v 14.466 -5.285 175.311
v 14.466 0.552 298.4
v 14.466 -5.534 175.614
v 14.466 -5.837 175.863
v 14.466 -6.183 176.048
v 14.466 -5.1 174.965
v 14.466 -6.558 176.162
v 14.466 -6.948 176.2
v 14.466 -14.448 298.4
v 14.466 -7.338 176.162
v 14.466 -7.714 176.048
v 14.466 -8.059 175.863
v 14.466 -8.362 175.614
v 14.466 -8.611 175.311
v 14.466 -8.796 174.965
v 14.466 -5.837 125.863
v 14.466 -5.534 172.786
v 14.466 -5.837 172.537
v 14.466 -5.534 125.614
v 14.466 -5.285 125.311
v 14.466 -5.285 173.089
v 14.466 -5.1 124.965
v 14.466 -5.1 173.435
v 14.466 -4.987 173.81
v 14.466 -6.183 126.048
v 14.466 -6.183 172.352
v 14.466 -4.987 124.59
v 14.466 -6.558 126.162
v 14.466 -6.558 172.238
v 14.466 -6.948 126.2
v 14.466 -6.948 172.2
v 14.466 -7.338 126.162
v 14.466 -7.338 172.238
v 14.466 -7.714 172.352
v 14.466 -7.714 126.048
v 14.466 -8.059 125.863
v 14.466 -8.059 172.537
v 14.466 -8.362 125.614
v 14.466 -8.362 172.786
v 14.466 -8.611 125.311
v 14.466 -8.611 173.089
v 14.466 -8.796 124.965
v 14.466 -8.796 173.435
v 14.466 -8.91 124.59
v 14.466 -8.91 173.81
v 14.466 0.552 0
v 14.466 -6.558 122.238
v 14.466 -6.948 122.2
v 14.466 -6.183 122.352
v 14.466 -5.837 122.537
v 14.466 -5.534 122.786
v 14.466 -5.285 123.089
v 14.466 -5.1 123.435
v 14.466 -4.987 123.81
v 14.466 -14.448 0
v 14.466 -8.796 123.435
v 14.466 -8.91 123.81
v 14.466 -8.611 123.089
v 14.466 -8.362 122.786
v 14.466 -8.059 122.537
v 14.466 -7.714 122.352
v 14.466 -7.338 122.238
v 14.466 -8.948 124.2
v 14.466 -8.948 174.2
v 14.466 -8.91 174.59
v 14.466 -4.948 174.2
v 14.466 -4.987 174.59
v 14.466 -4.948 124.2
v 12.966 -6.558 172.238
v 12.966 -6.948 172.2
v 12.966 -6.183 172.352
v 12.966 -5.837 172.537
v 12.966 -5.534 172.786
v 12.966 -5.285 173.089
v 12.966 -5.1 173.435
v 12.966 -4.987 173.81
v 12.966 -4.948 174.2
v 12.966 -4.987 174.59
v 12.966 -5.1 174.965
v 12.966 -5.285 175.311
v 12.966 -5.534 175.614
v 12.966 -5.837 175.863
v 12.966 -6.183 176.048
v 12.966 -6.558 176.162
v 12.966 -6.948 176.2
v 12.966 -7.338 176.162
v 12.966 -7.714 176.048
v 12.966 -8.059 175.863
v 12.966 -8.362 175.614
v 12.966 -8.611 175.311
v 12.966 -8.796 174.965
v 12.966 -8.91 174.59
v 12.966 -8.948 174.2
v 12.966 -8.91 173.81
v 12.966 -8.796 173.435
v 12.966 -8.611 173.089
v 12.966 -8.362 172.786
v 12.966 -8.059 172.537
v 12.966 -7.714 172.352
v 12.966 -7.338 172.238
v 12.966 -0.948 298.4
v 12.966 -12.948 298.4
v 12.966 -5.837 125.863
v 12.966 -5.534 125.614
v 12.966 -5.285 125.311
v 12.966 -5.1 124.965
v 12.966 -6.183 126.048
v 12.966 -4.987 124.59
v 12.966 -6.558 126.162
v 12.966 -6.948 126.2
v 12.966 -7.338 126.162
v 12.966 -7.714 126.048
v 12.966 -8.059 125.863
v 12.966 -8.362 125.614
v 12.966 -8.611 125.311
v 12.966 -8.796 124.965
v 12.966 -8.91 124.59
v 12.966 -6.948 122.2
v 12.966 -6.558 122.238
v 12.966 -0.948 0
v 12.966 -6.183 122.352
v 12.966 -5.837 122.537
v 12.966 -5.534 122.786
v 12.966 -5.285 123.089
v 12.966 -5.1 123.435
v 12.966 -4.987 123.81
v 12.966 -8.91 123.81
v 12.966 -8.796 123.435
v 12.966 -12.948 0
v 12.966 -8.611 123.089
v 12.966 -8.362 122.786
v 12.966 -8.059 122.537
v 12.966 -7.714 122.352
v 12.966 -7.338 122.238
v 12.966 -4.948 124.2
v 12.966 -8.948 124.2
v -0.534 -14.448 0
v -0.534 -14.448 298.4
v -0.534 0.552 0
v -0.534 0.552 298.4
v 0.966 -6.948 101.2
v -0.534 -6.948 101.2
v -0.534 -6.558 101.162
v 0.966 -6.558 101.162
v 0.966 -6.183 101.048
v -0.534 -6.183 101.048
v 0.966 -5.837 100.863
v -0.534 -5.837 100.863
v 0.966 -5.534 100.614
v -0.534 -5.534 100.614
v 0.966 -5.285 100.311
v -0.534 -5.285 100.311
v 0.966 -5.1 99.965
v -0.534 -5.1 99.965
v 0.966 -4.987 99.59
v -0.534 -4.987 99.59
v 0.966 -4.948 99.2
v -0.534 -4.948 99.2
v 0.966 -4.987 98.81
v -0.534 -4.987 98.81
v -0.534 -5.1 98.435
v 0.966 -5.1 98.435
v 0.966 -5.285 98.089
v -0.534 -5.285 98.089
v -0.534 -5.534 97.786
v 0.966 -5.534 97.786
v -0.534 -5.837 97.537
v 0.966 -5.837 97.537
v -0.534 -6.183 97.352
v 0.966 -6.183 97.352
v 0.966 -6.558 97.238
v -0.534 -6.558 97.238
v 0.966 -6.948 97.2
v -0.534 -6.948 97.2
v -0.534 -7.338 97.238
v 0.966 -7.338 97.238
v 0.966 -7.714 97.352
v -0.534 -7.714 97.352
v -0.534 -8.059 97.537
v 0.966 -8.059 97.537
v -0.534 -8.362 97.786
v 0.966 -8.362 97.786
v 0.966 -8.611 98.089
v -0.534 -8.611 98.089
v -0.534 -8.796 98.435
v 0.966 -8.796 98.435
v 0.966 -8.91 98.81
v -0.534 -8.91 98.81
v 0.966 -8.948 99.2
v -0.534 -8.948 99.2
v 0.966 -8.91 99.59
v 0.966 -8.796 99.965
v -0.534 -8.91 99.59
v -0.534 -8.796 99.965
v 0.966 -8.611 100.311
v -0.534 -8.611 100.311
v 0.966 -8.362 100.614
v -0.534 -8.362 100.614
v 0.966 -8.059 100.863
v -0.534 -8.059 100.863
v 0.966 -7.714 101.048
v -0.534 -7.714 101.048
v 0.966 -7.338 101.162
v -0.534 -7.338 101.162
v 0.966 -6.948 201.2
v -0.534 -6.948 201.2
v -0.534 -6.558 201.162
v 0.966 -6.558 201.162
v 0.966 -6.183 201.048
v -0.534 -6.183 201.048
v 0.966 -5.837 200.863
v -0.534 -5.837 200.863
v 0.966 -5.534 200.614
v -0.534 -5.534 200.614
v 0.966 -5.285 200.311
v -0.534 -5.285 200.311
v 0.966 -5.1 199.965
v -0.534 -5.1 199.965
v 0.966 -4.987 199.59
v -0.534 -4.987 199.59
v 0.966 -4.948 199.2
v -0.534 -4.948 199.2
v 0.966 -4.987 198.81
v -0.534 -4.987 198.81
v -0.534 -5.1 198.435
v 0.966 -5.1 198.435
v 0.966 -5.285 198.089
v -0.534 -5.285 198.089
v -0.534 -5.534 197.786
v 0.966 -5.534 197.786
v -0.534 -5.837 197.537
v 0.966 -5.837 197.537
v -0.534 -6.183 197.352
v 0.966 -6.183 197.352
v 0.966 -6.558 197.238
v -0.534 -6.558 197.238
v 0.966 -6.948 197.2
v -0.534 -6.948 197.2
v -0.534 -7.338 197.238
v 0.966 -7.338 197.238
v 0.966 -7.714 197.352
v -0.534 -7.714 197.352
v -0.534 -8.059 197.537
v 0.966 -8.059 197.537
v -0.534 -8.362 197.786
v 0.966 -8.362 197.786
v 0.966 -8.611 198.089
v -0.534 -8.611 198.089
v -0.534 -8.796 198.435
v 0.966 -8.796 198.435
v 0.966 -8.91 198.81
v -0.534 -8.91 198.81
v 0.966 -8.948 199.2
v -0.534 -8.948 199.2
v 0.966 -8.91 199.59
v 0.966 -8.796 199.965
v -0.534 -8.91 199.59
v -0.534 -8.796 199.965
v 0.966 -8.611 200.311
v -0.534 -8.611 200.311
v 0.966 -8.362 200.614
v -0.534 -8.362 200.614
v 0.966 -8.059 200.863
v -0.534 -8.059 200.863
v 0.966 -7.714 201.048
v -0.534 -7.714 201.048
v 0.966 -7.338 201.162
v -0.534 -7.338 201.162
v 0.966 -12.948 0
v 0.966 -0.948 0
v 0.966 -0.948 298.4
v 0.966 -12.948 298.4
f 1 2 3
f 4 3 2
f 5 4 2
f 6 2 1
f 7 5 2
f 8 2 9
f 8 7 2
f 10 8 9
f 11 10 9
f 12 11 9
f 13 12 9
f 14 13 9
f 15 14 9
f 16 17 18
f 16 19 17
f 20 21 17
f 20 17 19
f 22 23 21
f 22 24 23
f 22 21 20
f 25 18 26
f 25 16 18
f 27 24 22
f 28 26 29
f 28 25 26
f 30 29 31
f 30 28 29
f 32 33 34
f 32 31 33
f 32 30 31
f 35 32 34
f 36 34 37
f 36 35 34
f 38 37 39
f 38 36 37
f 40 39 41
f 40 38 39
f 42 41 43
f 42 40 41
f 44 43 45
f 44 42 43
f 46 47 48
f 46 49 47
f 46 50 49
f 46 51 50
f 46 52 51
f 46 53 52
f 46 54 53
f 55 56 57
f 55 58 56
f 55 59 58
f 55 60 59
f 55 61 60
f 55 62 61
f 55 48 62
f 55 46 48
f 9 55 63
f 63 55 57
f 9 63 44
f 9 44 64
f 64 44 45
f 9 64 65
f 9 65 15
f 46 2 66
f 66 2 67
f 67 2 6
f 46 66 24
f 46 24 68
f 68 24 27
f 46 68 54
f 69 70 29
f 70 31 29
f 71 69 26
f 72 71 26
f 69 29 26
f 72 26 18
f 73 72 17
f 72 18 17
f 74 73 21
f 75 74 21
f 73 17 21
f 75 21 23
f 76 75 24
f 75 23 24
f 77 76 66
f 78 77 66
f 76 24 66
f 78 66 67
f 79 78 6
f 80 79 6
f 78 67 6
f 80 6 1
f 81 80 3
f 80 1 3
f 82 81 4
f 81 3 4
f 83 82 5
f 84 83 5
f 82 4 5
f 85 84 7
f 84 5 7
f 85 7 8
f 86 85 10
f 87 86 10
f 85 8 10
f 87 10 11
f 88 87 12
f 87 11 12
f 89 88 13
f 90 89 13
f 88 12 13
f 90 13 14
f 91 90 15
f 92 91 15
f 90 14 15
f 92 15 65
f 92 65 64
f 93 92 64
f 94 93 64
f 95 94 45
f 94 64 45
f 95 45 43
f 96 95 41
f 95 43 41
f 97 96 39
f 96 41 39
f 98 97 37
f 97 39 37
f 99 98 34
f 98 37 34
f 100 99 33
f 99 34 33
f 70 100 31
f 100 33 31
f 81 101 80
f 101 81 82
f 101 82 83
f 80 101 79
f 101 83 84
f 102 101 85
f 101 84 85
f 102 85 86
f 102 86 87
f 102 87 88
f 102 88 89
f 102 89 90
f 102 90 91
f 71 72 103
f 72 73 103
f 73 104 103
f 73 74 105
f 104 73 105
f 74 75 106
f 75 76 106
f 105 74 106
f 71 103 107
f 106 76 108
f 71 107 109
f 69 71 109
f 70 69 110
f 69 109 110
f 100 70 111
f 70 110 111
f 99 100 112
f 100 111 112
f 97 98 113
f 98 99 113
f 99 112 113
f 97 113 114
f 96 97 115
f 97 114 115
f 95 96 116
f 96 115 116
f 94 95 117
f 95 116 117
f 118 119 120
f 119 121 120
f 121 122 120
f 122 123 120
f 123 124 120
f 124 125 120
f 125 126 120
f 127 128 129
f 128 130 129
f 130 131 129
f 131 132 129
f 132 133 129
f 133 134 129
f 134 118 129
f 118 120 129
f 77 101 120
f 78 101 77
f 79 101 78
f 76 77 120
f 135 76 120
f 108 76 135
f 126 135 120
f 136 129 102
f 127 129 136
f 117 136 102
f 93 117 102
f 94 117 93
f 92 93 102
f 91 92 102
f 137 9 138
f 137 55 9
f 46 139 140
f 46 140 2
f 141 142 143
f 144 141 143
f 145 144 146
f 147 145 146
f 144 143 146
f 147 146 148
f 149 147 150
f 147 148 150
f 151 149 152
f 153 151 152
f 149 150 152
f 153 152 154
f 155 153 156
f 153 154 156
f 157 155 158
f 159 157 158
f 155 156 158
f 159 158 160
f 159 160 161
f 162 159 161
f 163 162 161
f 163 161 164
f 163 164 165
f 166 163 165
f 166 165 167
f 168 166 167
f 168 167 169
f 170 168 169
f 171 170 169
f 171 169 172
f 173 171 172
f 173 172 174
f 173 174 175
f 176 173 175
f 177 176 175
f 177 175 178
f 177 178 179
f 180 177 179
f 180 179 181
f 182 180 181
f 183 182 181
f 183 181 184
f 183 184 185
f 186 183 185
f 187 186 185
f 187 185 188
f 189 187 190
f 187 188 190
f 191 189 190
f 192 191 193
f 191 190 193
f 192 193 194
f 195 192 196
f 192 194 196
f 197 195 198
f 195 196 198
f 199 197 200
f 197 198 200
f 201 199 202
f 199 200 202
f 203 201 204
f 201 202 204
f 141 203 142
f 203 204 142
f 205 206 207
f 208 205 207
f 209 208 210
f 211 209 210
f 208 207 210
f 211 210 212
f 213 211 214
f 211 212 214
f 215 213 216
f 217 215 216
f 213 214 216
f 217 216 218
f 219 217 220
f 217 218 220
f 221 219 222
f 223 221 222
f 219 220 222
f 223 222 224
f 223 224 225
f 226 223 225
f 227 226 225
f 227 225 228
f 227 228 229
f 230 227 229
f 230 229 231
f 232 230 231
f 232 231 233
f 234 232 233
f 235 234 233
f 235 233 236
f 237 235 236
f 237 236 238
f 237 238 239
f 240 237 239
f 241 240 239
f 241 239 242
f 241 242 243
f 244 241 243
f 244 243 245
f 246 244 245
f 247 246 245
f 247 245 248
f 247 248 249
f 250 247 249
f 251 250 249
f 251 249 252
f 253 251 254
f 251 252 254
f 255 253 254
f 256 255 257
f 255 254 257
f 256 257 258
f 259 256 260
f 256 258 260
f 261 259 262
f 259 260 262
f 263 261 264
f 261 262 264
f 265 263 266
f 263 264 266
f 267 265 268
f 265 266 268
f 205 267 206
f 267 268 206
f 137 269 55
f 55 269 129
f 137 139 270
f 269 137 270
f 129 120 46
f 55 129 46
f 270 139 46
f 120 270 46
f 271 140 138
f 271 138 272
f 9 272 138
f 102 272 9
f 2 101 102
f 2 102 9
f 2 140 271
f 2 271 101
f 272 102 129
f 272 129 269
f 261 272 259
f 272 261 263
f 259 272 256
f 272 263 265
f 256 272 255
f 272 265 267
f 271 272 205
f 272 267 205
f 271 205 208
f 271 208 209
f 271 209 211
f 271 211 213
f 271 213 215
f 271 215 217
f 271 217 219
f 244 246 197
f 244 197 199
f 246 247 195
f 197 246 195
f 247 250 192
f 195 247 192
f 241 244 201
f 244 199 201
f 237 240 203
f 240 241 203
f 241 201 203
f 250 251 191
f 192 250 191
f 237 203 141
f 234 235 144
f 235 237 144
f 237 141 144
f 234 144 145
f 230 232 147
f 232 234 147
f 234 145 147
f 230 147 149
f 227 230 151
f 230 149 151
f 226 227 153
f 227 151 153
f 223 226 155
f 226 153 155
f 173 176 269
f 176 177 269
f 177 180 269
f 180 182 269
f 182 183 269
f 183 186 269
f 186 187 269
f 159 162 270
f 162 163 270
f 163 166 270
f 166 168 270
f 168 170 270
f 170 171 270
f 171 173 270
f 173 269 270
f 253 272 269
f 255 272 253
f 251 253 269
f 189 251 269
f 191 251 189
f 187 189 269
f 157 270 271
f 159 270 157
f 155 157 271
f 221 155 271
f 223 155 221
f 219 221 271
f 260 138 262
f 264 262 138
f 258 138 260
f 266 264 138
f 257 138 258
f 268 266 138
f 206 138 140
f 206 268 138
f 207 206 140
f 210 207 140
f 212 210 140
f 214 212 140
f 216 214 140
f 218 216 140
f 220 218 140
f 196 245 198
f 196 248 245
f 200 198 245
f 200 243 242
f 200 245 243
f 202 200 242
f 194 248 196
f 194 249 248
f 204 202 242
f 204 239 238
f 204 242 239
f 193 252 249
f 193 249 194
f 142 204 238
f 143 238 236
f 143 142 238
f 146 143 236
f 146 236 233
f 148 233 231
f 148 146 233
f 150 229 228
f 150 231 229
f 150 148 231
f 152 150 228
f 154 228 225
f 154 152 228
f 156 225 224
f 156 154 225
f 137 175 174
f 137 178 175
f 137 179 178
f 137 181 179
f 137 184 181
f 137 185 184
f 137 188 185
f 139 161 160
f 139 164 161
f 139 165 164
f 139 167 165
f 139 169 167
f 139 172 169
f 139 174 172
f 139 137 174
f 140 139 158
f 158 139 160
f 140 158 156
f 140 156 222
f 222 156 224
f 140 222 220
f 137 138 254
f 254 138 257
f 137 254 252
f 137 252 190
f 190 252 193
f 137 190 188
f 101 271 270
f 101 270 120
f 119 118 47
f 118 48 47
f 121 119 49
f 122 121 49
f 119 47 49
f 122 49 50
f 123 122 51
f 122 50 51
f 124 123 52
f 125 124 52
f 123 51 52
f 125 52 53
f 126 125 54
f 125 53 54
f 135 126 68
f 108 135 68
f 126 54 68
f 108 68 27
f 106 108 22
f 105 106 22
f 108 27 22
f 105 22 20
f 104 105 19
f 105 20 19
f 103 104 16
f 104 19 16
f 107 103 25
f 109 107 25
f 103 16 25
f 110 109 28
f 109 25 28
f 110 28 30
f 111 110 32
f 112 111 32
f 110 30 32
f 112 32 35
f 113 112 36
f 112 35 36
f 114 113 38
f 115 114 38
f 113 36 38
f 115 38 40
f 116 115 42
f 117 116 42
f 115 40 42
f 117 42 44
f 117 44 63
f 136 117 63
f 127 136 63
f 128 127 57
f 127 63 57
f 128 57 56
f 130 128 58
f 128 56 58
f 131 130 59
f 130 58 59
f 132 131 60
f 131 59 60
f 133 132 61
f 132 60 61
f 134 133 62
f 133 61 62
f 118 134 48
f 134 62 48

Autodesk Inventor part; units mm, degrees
ref_plane "YZ Plane" through (0, 0, 0) normal (1, 0, 0) x (0, 1, 0)
ref_plane "XZ Plane" through (0, 0, 0) normal (0, 1, 0) x (-1, 0, 0)
ref_plane "XY Plane" through (0, 0, 0) normal (0, 0, 1) x (1, 0, 0)
sketch "Boceto1" plane through (0, 0, 0) normal (0, 0, 1) x (1, 0, 0)
  line L0 (-0.534, 0.5518) -> (14.466, 0.5518)
  line L1 (14.466, 0.5518) -> (14.466, -14.4482)
  line L2 (14.466, -14.4482) -> (-0.534, -14.4482)
  line L3 (-0.534, -14.4482) -> (-0.534, 0.5518)
  line L4 (0.966, -0.9482) -> (12.966, -0.9482)
  line L5 (12.966, -0.9482) -> (12.966, -12.9482)
  line L6 (12.966, -12.9482) -> (0.966, -12.9482)
  line L7 (0.966, -12.9482) -> (0.966, -0.9482)
  point P0 (0, 0)
  point P1 (6.966, -0.9482)
  dimension "d0" = 15
  dimension "d1" = 15
  dimension "d2" = 1.5
  dimension "d3" = 1.5
  dimension "d4" = 1.5
  dimension "d5" = 1.5
extrude "Extrusión1" add sketch "Boceto1" along normal blind 298.4
sketch "Boceto2" plane through (14.466, -14.4482, 0) normal (1, 0, 0) x (0, 0, -1)
  circle A0 centre (-174.2, 7.5) radius 2
  circle A1 centre (-124.2, 7.5) radius 2
  line L0 (0, 0) -> (-298.4, 0) projected
  line L1 (0, 0) -> (0, 15) projected
  point P0 (0, 14.4482)
  dimension "d8" = 4
  dimension "d9" = 4
  dimension "d10" = 7.5
  dimension "d11" = 7.5
  dimension "d12" = 50
  dimension "d13" = 124.2
extrude "Extrusión2" cut sketch "Boceto2" against normal blind 10
sketch "Boceto3" plane through (-0.534, -14.4482, 0) normal (-1, 0, 0) x (0, 0, 1)
  circle A0 centre (99.2, 7.5) radius 2
  circle A1 centre (199.2, 7.5) radius 2
  line L0 (0, 15) -> (0, 0) projected
  point P0 (0, 14.4482)
  dimension "d16" = 4
  dimension "d17" = 4
  dimension "d18" = 100
  dimension "d19" = 99.2
extrude "Extrusión3" cut sketch "Boceto3" against normal blind 10
properties part number "S_horizontal"
